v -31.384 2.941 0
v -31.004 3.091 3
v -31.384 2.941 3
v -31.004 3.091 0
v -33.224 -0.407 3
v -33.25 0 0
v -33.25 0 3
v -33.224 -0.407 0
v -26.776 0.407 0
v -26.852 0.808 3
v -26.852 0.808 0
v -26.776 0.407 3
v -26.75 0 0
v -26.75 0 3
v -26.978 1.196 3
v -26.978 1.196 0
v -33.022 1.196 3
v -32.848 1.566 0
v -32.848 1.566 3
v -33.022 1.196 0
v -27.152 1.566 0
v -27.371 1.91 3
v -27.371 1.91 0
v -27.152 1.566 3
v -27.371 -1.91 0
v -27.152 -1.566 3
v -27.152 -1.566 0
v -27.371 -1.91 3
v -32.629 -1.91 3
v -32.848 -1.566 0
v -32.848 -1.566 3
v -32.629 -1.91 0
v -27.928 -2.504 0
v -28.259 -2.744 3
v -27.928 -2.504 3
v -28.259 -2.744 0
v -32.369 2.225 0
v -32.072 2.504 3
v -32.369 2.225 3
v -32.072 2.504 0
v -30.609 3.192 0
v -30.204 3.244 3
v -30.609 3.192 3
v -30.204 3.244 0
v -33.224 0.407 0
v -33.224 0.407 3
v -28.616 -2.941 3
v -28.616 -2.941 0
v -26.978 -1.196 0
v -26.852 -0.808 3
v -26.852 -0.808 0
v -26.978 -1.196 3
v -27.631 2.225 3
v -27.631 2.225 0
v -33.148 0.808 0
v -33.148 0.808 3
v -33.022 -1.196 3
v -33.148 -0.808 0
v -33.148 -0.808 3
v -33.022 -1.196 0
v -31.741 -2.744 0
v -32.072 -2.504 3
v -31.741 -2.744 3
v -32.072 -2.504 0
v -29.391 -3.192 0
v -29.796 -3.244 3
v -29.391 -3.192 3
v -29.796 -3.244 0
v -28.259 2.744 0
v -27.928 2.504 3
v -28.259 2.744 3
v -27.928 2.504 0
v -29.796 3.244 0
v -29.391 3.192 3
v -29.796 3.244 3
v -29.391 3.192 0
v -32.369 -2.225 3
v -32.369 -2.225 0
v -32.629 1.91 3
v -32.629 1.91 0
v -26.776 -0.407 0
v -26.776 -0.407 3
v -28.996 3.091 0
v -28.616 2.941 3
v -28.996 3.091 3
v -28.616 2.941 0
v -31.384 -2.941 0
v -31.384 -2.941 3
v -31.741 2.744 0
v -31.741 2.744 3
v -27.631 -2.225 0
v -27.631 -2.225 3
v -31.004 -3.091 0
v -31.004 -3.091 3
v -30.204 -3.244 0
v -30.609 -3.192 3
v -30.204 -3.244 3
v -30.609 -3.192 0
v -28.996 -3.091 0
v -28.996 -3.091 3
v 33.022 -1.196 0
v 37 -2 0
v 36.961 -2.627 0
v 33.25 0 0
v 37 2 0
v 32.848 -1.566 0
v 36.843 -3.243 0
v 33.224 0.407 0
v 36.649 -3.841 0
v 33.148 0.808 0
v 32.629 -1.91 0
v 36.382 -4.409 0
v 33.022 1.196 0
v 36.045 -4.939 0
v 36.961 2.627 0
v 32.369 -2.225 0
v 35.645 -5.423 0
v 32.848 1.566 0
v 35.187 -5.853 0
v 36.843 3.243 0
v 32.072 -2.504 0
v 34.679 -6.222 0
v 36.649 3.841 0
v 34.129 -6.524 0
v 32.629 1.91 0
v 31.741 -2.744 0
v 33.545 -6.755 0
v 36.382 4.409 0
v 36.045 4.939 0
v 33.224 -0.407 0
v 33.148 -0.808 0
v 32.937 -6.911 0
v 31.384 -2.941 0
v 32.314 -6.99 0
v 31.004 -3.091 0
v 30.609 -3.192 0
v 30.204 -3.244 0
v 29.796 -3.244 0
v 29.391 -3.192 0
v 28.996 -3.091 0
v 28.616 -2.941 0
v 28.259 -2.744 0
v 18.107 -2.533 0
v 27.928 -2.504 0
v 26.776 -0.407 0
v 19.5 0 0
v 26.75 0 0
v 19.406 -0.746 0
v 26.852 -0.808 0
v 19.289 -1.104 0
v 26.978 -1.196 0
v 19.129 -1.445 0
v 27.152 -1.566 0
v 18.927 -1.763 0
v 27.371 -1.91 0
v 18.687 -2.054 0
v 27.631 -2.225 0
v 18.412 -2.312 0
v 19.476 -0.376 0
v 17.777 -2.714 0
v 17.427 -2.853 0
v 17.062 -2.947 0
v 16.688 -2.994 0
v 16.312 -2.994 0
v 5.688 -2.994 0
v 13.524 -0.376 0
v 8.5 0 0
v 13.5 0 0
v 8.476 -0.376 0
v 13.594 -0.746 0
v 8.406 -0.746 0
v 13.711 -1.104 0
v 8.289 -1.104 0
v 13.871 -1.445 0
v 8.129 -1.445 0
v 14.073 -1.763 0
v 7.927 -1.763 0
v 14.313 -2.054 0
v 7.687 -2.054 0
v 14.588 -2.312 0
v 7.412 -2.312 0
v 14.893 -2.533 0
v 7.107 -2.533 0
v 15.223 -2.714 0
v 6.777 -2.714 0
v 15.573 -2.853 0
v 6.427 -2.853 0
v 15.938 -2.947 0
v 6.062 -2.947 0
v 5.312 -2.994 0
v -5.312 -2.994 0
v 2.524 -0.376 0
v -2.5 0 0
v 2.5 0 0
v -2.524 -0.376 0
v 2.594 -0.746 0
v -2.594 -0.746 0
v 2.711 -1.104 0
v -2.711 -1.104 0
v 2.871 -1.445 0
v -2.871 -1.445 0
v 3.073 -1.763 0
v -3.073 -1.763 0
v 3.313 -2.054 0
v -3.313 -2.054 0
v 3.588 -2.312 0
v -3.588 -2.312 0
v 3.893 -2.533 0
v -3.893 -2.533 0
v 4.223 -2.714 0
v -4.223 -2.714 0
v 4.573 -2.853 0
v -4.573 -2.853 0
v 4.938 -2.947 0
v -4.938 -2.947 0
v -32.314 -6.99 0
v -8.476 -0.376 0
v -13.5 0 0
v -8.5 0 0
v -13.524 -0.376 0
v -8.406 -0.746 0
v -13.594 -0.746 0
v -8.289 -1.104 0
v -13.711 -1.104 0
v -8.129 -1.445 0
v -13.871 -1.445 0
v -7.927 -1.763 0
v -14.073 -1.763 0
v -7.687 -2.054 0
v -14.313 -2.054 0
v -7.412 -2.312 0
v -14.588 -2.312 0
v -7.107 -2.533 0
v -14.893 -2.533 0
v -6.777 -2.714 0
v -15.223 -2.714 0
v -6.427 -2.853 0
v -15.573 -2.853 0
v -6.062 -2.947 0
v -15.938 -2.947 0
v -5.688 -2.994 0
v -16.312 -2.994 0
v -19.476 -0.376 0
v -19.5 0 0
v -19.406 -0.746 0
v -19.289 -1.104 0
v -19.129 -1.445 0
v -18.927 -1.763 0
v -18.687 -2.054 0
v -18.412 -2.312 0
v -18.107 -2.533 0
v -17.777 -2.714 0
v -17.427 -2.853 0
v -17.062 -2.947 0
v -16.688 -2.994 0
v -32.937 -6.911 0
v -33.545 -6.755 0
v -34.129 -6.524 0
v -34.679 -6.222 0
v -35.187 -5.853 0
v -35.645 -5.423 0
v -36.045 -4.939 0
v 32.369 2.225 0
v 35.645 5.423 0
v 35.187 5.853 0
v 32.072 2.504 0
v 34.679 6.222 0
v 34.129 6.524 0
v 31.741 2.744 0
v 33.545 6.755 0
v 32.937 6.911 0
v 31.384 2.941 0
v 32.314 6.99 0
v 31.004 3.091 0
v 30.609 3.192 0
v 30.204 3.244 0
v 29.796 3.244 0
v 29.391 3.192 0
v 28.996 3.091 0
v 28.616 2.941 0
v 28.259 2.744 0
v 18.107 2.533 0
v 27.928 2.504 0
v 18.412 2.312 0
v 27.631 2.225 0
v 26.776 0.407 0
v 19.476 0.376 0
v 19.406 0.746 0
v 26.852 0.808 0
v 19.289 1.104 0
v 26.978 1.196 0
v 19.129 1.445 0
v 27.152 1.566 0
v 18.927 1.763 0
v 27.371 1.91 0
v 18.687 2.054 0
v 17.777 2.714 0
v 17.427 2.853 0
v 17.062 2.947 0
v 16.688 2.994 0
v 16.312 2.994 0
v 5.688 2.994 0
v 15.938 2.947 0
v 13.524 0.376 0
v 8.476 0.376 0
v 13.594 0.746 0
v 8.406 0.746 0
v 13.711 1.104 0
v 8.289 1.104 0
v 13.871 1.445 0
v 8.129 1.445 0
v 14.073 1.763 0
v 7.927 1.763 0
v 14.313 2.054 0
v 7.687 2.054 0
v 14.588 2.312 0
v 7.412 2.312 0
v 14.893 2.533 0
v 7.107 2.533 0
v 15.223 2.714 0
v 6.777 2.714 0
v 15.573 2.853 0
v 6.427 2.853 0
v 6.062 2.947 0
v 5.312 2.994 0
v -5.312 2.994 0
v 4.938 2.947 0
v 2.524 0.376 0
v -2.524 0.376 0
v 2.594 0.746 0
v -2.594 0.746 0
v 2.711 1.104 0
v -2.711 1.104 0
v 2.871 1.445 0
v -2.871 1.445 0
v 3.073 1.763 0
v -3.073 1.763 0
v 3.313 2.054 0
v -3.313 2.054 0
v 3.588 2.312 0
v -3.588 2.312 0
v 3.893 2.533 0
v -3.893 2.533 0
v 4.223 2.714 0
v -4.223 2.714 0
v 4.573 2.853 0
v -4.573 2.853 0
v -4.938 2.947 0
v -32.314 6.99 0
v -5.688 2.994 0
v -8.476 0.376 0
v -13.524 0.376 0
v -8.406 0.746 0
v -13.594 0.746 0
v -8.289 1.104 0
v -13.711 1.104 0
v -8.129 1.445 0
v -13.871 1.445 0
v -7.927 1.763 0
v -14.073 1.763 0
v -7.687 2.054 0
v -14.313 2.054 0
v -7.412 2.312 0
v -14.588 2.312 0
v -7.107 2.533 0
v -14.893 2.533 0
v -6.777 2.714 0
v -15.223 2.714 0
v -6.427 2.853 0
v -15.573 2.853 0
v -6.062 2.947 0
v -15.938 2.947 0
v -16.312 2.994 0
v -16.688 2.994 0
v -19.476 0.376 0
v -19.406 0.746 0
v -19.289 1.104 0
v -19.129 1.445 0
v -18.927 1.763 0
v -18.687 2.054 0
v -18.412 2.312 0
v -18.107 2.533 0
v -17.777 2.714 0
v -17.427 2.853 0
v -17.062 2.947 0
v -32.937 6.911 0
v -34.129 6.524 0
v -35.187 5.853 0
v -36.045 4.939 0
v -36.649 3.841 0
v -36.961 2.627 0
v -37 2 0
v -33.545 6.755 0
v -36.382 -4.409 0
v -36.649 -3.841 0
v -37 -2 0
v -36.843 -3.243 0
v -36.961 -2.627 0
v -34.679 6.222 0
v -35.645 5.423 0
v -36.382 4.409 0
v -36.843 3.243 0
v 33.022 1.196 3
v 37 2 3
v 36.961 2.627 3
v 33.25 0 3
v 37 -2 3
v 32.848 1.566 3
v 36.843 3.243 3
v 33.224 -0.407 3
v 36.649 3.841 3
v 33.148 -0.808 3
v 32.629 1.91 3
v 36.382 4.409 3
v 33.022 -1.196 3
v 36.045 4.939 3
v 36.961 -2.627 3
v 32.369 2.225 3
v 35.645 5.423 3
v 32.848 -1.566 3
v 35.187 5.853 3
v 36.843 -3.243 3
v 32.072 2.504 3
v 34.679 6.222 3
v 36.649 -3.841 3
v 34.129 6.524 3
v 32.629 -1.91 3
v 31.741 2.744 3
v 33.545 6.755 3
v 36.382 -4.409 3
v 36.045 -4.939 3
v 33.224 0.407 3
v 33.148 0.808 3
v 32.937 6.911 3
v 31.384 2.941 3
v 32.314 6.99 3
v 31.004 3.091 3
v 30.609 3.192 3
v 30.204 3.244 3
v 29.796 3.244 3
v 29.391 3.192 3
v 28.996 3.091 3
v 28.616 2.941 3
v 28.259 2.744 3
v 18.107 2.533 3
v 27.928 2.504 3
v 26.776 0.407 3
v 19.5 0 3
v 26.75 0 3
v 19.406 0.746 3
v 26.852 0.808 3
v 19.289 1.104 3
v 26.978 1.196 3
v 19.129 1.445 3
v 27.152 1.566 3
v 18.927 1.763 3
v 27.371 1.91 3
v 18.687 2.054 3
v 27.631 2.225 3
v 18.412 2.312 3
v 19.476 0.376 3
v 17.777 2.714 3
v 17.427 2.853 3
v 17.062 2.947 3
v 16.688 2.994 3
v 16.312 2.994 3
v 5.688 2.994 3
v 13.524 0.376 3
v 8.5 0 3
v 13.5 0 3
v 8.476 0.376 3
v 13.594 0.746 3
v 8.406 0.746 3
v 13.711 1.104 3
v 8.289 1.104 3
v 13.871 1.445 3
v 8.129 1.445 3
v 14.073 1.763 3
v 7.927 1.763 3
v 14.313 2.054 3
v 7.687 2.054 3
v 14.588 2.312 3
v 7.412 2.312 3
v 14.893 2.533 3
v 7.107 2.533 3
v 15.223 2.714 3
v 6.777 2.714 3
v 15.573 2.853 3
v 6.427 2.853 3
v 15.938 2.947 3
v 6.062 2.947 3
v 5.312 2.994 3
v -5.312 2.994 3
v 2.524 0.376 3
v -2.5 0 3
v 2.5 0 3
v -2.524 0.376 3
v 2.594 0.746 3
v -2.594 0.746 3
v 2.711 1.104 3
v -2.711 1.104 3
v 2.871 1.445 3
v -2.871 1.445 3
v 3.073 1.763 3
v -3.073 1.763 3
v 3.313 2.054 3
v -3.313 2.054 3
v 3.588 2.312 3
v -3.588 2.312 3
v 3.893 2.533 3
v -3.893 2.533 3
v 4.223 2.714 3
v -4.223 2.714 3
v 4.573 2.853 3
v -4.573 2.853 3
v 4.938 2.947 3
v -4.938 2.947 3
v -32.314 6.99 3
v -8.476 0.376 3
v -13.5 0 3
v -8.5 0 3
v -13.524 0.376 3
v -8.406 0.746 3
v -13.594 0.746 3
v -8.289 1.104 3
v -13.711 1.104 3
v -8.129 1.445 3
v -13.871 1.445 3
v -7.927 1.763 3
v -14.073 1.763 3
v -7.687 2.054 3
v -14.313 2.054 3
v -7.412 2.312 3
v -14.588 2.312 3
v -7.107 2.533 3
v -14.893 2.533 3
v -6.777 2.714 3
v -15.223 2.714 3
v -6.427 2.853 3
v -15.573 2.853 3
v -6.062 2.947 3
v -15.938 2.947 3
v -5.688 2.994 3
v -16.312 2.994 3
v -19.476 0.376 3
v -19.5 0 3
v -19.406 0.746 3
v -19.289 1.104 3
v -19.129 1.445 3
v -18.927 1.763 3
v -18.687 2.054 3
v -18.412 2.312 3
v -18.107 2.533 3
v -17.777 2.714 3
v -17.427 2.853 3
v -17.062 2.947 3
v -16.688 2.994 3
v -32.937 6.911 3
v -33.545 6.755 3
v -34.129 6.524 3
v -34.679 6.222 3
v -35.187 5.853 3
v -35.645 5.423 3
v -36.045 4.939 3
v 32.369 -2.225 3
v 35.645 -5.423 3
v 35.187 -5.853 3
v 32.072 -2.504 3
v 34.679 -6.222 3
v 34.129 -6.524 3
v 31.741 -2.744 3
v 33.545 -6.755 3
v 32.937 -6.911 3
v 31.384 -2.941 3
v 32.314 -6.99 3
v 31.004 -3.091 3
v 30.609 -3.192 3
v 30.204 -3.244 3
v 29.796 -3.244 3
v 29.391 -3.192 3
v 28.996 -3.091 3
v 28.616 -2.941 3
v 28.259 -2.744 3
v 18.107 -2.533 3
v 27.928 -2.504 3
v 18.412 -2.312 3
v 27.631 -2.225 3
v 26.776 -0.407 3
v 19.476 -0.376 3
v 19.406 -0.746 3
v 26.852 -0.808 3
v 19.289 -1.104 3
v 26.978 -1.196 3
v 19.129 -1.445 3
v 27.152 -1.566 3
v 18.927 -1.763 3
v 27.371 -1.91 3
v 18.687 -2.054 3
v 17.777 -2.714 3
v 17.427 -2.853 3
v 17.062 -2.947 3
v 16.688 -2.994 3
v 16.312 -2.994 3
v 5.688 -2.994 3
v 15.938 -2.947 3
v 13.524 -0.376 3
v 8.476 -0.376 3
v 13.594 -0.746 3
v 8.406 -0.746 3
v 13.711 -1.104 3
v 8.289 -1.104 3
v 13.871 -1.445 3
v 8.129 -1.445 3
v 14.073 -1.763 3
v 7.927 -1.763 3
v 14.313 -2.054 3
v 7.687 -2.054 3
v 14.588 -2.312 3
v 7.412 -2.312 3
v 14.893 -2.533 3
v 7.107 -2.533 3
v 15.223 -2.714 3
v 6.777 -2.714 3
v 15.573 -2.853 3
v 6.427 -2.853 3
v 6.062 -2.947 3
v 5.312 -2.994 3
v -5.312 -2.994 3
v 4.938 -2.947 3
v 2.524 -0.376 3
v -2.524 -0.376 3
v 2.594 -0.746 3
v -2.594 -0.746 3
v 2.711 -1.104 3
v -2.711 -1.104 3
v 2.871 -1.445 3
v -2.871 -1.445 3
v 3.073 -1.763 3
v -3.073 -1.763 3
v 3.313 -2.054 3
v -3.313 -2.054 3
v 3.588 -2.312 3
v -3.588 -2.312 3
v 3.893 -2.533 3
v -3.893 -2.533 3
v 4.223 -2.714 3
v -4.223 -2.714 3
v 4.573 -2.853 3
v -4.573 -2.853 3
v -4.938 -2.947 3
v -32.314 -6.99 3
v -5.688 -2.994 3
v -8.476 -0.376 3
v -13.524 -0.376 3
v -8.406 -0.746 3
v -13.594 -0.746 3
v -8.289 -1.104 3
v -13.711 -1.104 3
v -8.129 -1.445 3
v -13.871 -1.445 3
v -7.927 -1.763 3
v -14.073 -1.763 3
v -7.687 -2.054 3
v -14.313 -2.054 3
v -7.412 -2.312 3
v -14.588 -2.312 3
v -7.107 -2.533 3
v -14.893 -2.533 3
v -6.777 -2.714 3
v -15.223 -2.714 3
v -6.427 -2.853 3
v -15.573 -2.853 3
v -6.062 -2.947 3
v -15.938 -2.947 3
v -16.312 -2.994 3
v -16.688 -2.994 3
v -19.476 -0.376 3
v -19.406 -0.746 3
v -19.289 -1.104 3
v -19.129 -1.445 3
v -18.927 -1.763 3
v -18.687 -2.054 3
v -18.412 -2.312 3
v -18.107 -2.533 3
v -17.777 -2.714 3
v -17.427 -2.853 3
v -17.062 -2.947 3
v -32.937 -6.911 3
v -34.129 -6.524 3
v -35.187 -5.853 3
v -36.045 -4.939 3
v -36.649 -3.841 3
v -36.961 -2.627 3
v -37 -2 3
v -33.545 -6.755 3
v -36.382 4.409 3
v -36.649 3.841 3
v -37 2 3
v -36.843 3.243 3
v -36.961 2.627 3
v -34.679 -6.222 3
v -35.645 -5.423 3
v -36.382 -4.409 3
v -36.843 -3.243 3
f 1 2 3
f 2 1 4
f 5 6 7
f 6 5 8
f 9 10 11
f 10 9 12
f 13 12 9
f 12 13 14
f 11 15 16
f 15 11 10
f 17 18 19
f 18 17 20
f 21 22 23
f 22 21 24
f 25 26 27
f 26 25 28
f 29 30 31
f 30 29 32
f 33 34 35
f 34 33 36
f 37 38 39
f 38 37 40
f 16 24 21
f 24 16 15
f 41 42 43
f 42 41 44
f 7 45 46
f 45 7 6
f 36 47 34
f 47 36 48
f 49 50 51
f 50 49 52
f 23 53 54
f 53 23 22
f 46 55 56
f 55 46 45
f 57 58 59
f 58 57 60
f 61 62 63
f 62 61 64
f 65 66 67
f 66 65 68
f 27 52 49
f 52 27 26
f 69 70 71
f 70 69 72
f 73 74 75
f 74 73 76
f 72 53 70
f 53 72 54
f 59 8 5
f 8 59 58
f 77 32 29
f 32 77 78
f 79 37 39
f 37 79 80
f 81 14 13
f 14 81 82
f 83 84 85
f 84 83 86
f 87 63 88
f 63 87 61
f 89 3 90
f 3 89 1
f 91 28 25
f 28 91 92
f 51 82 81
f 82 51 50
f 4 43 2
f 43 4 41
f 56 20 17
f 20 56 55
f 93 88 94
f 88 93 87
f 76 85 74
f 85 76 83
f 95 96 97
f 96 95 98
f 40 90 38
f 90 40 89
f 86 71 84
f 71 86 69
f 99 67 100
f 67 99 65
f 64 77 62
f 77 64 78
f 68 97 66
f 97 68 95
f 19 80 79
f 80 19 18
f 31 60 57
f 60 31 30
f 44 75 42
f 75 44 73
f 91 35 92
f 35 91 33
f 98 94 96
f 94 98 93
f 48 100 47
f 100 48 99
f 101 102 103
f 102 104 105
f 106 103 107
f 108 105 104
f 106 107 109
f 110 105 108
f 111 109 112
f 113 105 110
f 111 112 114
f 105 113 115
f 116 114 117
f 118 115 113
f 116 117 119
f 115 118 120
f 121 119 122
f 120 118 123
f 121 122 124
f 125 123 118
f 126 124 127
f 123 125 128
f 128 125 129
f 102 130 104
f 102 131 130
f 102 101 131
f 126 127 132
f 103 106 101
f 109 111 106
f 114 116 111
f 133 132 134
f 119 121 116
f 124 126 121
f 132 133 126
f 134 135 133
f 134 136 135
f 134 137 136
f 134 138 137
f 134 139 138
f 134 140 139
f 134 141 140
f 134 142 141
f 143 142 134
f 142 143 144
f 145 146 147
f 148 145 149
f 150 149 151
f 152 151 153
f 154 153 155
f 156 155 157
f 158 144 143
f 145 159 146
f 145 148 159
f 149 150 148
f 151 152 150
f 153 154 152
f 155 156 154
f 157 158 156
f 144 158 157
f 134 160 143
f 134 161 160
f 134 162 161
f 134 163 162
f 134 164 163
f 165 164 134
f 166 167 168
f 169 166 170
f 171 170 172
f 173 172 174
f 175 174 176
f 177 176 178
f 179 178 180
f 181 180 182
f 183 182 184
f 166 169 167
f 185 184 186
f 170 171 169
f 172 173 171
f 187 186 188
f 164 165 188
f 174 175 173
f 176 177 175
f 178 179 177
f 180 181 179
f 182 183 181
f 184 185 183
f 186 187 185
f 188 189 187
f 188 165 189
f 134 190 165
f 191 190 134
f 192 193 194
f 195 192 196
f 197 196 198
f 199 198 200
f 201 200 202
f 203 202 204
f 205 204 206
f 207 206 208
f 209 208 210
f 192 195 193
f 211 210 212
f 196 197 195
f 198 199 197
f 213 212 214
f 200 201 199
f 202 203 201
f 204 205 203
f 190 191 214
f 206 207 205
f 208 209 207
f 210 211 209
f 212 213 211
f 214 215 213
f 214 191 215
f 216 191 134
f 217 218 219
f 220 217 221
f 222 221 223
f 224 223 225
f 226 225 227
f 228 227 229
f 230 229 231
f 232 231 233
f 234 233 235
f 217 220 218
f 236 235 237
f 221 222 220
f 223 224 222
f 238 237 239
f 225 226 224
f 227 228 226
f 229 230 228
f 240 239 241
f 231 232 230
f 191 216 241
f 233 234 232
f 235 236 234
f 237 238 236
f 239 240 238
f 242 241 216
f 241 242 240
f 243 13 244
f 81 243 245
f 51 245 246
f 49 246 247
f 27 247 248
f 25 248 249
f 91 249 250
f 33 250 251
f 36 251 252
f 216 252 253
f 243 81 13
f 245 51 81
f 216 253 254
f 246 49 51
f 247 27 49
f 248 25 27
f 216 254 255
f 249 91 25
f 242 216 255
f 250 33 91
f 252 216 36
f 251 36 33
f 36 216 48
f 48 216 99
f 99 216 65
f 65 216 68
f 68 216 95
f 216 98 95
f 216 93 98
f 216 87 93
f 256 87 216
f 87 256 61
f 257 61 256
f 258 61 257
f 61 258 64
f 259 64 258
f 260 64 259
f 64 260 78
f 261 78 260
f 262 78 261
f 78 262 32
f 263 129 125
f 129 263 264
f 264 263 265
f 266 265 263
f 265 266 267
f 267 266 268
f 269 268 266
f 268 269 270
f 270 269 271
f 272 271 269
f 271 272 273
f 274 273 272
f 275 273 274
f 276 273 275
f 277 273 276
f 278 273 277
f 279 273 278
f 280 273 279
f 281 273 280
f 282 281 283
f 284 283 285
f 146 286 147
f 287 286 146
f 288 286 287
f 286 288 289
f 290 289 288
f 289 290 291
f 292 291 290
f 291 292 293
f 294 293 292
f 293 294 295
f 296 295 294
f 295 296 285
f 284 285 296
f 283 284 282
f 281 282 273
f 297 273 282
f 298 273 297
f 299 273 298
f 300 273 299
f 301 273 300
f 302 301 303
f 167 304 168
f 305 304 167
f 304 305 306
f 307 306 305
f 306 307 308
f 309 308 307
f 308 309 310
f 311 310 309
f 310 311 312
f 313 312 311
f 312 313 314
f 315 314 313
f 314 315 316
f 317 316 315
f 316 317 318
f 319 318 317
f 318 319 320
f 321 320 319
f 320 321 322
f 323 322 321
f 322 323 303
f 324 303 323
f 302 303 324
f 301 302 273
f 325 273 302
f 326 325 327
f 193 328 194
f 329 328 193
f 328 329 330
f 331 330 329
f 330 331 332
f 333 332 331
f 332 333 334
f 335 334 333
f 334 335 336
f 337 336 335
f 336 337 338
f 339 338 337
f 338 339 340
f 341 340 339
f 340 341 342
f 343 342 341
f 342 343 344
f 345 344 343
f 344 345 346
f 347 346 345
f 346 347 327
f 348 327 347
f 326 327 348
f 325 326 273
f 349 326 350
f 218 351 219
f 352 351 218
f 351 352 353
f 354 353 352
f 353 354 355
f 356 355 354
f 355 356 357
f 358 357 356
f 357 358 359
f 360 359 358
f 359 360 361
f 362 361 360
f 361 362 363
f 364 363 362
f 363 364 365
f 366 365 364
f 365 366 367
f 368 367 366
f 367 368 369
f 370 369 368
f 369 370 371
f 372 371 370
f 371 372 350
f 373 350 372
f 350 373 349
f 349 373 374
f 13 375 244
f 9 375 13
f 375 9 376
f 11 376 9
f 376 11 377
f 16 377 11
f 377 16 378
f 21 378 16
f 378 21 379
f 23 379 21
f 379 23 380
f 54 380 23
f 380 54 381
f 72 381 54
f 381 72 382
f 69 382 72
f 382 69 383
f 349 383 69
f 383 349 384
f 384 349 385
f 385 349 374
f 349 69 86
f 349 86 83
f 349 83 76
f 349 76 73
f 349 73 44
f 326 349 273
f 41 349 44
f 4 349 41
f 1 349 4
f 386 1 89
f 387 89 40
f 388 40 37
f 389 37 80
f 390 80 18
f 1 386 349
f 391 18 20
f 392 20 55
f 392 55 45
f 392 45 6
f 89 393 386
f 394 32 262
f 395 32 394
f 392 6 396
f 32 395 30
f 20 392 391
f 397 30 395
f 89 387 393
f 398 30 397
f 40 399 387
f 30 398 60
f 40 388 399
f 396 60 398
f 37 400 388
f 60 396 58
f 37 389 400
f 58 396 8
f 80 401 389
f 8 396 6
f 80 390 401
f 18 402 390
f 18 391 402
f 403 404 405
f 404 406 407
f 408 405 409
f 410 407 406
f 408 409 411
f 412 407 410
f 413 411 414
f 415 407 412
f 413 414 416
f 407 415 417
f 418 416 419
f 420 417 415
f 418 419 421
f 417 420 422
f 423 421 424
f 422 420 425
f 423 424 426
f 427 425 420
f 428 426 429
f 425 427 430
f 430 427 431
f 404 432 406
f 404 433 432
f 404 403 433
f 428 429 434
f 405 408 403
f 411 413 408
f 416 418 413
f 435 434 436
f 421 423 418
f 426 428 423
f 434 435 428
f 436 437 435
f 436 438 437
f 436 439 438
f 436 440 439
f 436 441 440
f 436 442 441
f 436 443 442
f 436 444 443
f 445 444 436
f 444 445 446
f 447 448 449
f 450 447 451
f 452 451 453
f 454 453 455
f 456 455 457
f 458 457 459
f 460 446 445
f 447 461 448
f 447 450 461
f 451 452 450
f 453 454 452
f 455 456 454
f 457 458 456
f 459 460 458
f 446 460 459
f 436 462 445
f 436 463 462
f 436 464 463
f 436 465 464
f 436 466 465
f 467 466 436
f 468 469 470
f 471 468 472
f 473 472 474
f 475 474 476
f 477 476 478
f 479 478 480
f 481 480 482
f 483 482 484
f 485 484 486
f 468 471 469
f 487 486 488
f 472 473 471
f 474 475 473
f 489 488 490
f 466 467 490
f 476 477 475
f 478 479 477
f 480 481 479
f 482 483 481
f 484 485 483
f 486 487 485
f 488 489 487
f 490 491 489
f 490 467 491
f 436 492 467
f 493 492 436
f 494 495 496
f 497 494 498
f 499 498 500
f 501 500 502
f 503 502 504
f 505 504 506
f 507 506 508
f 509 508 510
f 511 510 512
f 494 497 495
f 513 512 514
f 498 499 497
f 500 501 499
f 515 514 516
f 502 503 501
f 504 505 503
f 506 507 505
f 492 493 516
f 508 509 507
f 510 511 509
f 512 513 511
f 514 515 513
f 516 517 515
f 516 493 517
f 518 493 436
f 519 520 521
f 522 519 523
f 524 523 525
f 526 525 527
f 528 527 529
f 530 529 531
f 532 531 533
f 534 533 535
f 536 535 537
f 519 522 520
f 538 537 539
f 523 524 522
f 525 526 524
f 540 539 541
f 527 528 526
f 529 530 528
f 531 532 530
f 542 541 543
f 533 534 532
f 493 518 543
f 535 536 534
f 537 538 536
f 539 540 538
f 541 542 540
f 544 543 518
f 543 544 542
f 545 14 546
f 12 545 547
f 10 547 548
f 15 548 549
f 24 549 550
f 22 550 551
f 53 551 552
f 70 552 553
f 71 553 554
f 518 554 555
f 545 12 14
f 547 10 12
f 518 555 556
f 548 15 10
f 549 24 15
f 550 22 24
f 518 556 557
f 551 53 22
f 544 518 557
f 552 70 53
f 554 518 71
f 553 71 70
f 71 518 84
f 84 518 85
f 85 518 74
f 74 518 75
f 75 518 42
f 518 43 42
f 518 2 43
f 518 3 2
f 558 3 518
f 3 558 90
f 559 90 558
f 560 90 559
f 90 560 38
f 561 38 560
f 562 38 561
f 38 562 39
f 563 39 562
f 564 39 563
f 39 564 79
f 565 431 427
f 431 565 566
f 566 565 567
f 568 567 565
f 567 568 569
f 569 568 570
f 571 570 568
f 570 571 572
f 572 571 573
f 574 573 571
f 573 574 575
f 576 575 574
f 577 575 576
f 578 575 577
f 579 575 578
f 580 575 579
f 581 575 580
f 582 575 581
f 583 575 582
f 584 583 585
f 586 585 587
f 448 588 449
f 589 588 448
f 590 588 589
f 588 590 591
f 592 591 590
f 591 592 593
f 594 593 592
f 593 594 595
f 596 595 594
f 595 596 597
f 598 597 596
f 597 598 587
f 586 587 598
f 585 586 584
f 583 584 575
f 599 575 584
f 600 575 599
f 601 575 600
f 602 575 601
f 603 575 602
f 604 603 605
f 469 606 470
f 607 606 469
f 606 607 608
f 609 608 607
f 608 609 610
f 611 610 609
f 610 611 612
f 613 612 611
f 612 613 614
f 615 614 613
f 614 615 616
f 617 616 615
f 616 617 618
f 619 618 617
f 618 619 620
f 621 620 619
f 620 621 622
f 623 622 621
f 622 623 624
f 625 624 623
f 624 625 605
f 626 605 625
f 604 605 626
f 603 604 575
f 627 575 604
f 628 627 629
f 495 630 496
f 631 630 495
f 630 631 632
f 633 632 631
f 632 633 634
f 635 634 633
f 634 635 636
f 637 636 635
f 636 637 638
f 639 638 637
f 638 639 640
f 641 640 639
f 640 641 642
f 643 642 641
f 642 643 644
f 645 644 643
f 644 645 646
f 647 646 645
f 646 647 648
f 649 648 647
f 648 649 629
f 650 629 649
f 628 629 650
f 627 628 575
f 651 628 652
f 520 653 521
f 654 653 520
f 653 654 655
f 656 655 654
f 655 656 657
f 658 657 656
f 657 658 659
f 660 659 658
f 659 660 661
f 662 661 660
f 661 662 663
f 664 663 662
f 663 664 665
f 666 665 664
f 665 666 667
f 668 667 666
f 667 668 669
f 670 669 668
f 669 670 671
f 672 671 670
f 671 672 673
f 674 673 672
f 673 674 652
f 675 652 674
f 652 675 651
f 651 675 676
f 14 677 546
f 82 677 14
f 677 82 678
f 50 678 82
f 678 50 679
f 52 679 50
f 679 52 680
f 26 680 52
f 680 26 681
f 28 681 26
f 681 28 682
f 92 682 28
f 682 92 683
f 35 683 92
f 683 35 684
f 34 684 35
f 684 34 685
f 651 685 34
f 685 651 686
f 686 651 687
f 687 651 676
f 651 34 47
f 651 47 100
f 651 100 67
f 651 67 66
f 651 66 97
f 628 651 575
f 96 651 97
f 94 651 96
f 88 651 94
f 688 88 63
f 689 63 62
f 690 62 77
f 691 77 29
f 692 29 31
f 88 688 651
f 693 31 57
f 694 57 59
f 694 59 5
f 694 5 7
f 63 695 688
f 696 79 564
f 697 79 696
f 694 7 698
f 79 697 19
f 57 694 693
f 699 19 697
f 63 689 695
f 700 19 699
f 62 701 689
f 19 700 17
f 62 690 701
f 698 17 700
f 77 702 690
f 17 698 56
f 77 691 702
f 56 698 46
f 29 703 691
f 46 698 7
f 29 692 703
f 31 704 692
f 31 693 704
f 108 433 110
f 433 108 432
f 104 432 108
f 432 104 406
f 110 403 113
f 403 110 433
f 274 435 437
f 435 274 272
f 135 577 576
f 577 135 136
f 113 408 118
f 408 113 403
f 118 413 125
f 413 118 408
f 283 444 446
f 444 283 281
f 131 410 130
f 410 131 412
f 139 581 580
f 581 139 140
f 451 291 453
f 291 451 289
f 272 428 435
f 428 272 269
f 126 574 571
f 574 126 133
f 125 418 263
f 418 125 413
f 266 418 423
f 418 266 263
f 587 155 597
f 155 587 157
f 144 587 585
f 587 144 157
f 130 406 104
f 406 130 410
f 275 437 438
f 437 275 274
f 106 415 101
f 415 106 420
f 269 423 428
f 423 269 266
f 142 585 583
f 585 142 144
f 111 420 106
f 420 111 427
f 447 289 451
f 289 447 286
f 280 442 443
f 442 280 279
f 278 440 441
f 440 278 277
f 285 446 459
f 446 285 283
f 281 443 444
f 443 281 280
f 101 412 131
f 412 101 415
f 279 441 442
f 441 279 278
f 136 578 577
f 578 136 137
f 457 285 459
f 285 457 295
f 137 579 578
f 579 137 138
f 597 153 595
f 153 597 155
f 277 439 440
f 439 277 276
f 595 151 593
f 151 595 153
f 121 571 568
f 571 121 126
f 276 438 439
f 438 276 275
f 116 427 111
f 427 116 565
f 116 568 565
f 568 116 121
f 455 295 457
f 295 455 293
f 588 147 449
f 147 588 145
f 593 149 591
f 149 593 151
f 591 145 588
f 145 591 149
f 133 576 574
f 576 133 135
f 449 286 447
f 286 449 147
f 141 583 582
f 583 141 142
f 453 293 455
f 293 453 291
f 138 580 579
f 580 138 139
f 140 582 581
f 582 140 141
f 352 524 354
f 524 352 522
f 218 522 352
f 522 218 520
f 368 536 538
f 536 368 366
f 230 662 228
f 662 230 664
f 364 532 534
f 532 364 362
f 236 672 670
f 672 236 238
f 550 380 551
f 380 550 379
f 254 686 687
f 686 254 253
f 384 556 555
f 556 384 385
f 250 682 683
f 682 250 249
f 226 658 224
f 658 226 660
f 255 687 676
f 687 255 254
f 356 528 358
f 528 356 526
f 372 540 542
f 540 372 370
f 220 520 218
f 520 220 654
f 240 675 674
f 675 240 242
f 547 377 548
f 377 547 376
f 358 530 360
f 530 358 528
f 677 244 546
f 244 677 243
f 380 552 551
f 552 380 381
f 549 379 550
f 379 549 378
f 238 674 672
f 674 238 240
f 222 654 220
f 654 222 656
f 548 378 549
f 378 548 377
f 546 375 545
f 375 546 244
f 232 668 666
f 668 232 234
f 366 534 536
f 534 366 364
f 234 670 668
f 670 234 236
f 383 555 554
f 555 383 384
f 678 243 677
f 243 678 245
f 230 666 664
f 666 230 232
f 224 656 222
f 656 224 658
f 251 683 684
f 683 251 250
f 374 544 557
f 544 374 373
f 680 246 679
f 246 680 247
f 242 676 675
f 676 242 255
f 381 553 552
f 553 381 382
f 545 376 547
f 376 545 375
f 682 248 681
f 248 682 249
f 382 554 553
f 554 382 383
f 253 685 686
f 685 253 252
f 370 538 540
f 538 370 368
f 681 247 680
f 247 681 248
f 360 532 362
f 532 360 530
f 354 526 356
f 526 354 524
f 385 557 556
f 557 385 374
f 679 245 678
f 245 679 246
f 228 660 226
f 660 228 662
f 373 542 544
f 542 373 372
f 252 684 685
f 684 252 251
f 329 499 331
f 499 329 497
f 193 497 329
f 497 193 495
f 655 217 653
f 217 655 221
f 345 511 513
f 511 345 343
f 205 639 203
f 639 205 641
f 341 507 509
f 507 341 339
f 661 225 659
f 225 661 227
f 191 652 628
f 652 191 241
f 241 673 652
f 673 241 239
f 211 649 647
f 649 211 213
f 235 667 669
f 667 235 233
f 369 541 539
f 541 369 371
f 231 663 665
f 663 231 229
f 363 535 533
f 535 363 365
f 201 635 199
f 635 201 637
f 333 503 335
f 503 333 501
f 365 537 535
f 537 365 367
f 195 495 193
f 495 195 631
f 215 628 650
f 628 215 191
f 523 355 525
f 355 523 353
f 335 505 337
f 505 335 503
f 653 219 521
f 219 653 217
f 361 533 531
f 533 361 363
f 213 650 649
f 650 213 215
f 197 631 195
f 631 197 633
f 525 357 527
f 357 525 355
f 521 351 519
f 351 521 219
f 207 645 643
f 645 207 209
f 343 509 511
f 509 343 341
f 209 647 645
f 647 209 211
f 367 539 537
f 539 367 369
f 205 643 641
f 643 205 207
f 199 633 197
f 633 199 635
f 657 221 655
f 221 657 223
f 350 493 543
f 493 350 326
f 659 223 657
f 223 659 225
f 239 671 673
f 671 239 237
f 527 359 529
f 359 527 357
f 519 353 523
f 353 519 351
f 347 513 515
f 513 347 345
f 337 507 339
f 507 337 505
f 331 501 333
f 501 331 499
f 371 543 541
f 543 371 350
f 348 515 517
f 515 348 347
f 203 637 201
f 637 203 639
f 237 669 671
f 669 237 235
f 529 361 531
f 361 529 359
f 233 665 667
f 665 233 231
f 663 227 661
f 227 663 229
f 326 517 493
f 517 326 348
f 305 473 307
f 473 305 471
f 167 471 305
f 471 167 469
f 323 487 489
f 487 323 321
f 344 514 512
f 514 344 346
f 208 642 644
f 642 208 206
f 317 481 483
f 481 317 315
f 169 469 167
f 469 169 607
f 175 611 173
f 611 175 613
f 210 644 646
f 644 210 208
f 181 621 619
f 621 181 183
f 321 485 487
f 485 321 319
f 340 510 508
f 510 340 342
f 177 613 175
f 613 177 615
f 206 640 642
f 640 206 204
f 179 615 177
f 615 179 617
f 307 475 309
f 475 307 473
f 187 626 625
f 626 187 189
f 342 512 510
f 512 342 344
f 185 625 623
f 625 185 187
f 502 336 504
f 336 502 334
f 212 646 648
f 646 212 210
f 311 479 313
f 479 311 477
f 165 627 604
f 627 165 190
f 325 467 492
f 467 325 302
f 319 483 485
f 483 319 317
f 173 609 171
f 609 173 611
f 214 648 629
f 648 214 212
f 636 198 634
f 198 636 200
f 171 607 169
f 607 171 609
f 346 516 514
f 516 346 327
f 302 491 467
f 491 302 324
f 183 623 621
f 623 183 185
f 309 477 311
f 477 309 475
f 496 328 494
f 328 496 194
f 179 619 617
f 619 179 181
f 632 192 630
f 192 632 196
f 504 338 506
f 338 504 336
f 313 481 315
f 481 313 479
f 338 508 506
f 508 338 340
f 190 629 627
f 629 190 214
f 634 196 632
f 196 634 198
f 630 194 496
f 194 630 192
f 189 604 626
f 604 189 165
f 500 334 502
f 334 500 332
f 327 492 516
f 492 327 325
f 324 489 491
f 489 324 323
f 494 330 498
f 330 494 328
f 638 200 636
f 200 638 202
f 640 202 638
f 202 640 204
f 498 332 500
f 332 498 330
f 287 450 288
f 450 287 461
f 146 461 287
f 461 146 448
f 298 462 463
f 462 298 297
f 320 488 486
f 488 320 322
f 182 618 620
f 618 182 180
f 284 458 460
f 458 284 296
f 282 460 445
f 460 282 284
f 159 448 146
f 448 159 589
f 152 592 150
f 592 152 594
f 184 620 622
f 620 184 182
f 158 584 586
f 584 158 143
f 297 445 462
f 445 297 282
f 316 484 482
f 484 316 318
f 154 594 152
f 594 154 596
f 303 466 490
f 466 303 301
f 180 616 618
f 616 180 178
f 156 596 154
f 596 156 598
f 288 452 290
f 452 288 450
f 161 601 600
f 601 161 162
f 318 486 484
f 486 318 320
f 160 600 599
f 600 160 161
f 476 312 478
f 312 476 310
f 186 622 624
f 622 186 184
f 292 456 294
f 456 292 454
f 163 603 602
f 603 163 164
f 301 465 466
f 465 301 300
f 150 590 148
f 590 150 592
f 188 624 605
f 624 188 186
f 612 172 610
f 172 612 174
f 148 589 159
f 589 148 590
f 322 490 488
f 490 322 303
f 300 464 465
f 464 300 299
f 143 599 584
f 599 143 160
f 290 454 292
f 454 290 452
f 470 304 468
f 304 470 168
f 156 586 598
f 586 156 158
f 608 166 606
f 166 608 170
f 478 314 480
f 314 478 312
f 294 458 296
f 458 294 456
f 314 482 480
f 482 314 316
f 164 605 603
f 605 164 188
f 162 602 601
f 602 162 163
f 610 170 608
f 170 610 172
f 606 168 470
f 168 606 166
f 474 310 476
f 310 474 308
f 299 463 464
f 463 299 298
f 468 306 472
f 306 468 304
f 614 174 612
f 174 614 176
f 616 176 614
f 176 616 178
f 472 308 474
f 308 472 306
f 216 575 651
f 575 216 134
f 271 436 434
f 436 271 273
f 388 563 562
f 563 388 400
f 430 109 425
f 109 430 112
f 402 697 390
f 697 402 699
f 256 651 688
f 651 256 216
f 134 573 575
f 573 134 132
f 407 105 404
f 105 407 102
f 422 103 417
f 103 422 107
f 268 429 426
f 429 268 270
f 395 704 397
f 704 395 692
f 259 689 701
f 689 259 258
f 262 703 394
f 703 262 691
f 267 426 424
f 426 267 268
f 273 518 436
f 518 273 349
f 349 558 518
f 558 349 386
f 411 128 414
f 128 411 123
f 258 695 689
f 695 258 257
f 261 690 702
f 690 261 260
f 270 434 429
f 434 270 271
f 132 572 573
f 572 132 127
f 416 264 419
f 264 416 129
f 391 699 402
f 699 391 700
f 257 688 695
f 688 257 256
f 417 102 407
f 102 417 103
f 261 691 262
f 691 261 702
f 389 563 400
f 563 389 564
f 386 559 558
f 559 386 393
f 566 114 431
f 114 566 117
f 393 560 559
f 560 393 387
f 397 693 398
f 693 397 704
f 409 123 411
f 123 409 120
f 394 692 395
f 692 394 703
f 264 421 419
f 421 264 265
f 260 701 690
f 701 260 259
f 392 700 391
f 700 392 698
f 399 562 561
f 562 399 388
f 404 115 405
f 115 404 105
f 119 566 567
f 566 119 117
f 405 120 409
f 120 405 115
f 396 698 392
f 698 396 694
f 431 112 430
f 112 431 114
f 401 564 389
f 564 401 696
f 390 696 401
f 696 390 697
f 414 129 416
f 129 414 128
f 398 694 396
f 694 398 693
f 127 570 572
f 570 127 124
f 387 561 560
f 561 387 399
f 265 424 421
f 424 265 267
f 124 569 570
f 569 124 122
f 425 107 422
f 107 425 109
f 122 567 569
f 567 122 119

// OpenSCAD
$fn = 50;

difference() {
	union() {
		hull() {
			translate(v = [-32.0, 2.0, 0]) {
				cylinder(h = 3, r = 5);
			}
			translate(v = [32.0, 2.0, 0]) {
				cylinder(h = 3, r = 5);
			}
			translate(v = [-32.0, -2.0, 0]) {
				cylinder(h = 3, r = 5);
			}
			translate(v = [32.0, -2.0, 0]) {
				cylinder(h = 3, r = 5);
			}
		}
	}
	union() {
		translate(v = [-30.0, 0.0, 0]) {
			cylinder(h = 3, r = 3.25);
		}
		translate(v = [30.0, 0.0, 0]) {
			cylinder(h = 3, r = 3.25);
		}
		translate(v = [-16.5, 0, 0.0]) {
			cylinder(h = 3, r = 3.0);
		}
		translate(v = [-5.5, 0, 0.0]) {
			cylinder(h = 3, r = 3.0);
		}
		translate(v = [5.5, 0, 0.0]) {
			cylinder(h = 3, r = 3.0);
		}
		translate(v = [16.5, 0, 0.0]) {
			cylinder(h = 3, r = 3.0);
		}
	}
}
